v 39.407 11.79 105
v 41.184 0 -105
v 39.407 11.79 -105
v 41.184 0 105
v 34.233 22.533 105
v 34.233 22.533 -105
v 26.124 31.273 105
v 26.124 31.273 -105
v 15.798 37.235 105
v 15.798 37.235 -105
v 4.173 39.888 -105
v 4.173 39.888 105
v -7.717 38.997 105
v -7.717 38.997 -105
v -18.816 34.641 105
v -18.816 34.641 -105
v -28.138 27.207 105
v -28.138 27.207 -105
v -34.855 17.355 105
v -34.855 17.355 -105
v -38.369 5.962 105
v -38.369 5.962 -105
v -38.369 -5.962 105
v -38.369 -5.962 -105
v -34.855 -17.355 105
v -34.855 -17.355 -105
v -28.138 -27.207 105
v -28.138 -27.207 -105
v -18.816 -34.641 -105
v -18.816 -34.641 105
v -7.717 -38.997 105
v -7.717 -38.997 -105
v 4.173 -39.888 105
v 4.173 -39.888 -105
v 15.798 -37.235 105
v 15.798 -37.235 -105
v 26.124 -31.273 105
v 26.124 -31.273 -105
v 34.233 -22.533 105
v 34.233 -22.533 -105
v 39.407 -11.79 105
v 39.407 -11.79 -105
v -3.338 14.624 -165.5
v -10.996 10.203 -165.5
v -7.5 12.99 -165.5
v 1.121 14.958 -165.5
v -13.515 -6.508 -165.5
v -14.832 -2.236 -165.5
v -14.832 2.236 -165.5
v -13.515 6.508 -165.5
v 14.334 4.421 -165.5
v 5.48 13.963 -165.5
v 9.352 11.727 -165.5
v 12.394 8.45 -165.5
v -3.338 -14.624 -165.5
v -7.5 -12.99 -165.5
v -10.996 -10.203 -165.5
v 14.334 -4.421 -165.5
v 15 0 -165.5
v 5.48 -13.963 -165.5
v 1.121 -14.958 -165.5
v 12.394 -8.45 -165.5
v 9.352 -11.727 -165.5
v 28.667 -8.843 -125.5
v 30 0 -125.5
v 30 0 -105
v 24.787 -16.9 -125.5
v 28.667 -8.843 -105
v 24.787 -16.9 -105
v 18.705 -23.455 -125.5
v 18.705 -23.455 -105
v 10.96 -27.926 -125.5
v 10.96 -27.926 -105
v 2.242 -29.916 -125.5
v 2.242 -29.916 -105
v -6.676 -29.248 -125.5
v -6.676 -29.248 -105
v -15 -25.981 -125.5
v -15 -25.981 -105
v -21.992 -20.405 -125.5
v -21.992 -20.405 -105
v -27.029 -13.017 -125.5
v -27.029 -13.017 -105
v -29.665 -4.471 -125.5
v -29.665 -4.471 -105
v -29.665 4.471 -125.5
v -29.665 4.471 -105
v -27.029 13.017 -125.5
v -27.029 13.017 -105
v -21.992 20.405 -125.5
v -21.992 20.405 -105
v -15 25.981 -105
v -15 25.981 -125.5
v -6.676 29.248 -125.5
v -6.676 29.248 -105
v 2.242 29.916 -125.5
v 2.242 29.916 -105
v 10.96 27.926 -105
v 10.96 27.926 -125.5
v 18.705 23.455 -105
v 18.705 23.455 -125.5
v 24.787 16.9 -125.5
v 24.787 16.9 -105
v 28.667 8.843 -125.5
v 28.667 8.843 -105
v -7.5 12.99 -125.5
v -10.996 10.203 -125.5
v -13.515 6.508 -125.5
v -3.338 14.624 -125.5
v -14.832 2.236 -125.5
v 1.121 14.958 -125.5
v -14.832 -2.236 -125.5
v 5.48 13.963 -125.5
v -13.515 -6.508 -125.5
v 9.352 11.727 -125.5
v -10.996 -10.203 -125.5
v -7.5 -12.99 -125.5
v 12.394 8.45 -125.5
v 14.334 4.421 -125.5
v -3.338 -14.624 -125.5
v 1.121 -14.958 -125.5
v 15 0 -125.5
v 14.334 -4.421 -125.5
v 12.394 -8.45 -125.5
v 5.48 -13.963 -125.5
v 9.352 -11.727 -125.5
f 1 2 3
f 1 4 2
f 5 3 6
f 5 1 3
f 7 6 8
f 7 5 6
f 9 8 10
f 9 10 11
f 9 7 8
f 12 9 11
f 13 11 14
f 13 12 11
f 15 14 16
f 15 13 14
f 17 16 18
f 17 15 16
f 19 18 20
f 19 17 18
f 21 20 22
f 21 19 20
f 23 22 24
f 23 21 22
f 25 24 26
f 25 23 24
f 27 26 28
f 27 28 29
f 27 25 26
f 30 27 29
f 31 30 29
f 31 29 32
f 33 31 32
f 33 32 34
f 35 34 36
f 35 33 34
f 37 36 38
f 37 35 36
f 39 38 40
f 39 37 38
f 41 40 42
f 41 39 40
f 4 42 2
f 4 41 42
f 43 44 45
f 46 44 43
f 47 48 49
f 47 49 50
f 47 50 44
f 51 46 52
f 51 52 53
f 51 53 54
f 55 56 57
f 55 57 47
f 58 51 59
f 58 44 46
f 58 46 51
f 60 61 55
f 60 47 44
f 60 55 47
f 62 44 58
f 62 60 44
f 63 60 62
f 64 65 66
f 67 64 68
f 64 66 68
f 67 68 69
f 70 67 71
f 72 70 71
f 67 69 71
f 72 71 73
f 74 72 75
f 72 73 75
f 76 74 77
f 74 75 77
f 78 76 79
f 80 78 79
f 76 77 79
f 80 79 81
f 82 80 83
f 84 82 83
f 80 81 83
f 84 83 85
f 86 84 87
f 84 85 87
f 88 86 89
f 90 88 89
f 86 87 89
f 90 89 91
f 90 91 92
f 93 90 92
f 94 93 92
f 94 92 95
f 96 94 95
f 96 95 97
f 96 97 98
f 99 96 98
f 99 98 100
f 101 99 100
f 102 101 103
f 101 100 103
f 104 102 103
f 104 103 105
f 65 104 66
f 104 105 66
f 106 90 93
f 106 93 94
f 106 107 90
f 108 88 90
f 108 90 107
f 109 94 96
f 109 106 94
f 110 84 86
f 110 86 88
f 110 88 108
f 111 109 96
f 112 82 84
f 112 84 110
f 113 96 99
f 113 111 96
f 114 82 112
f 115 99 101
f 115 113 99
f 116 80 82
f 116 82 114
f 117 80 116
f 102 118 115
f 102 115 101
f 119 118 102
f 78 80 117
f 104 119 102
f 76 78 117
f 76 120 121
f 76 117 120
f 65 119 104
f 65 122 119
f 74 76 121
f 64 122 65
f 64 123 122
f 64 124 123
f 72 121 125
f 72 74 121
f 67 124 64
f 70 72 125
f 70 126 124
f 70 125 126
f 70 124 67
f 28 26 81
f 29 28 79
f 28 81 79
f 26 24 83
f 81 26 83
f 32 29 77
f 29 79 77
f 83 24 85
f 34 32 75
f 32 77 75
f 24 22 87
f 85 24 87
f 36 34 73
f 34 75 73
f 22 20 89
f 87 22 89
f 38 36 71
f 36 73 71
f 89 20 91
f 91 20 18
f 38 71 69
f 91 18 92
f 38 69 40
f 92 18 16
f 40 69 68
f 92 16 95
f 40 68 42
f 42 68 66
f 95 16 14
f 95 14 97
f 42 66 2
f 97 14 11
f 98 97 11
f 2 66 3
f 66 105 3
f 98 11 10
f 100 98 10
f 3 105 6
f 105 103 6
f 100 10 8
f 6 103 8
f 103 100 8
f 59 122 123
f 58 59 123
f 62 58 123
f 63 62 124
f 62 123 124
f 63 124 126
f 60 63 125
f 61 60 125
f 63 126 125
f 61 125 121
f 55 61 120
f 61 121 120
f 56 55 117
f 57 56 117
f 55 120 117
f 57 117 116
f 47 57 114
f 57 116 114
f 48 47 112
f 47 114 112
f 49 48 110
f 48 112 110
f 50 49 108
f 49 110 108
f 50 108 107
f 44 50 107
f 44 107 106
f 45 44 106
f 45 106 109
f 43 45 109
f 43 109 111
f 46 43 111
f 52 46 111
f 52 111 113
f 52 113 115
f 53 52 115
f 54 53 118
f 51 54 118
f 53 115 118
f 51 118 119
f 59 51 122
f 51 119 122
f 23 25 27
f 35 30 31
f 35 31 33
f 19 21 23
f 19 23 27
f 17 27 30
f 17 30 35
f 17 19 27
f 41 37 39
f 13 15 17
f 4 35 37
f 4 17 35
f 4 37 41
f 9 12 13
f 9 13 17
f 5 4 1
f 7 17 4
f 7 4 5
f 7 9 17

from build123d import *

# Parameters (mm, degrees)
F0_R     = 40
F1_DEPTH = 105
F2_R     = 30
F3_DEPTH = 20.5
F4_R     = 15
F5_DEPTH = 40


with BuildPart() as f1:
    # F0 (on Top) → F1 (new body, symmetric)
    with BuildSketch(Plane.XY):
        with Locations((1.18393, 0)):
            Circle(F0_R)
    extrude(amount=F1_DEPTH, both=True)

    # F2 (on face) → F3 (join)
    with BuildSketch(Plane(origin=(0, 0, -105), x_dir=(1, 0, 0), z_dir=(0, 0, -1))):
        Circle(F2_R)
    extrude(amount=F3_DEPTH)

    # F4 (on face) → F5 (join)
    with BuildSketch(Plane(origin=(0, 0, -125.5), x_dir=(1, 0, 0), z_dir=(0, 0, -1))):
        Circle(F4_R)
    extrude(amount=F5_DEPTH)


solid = f1.part
